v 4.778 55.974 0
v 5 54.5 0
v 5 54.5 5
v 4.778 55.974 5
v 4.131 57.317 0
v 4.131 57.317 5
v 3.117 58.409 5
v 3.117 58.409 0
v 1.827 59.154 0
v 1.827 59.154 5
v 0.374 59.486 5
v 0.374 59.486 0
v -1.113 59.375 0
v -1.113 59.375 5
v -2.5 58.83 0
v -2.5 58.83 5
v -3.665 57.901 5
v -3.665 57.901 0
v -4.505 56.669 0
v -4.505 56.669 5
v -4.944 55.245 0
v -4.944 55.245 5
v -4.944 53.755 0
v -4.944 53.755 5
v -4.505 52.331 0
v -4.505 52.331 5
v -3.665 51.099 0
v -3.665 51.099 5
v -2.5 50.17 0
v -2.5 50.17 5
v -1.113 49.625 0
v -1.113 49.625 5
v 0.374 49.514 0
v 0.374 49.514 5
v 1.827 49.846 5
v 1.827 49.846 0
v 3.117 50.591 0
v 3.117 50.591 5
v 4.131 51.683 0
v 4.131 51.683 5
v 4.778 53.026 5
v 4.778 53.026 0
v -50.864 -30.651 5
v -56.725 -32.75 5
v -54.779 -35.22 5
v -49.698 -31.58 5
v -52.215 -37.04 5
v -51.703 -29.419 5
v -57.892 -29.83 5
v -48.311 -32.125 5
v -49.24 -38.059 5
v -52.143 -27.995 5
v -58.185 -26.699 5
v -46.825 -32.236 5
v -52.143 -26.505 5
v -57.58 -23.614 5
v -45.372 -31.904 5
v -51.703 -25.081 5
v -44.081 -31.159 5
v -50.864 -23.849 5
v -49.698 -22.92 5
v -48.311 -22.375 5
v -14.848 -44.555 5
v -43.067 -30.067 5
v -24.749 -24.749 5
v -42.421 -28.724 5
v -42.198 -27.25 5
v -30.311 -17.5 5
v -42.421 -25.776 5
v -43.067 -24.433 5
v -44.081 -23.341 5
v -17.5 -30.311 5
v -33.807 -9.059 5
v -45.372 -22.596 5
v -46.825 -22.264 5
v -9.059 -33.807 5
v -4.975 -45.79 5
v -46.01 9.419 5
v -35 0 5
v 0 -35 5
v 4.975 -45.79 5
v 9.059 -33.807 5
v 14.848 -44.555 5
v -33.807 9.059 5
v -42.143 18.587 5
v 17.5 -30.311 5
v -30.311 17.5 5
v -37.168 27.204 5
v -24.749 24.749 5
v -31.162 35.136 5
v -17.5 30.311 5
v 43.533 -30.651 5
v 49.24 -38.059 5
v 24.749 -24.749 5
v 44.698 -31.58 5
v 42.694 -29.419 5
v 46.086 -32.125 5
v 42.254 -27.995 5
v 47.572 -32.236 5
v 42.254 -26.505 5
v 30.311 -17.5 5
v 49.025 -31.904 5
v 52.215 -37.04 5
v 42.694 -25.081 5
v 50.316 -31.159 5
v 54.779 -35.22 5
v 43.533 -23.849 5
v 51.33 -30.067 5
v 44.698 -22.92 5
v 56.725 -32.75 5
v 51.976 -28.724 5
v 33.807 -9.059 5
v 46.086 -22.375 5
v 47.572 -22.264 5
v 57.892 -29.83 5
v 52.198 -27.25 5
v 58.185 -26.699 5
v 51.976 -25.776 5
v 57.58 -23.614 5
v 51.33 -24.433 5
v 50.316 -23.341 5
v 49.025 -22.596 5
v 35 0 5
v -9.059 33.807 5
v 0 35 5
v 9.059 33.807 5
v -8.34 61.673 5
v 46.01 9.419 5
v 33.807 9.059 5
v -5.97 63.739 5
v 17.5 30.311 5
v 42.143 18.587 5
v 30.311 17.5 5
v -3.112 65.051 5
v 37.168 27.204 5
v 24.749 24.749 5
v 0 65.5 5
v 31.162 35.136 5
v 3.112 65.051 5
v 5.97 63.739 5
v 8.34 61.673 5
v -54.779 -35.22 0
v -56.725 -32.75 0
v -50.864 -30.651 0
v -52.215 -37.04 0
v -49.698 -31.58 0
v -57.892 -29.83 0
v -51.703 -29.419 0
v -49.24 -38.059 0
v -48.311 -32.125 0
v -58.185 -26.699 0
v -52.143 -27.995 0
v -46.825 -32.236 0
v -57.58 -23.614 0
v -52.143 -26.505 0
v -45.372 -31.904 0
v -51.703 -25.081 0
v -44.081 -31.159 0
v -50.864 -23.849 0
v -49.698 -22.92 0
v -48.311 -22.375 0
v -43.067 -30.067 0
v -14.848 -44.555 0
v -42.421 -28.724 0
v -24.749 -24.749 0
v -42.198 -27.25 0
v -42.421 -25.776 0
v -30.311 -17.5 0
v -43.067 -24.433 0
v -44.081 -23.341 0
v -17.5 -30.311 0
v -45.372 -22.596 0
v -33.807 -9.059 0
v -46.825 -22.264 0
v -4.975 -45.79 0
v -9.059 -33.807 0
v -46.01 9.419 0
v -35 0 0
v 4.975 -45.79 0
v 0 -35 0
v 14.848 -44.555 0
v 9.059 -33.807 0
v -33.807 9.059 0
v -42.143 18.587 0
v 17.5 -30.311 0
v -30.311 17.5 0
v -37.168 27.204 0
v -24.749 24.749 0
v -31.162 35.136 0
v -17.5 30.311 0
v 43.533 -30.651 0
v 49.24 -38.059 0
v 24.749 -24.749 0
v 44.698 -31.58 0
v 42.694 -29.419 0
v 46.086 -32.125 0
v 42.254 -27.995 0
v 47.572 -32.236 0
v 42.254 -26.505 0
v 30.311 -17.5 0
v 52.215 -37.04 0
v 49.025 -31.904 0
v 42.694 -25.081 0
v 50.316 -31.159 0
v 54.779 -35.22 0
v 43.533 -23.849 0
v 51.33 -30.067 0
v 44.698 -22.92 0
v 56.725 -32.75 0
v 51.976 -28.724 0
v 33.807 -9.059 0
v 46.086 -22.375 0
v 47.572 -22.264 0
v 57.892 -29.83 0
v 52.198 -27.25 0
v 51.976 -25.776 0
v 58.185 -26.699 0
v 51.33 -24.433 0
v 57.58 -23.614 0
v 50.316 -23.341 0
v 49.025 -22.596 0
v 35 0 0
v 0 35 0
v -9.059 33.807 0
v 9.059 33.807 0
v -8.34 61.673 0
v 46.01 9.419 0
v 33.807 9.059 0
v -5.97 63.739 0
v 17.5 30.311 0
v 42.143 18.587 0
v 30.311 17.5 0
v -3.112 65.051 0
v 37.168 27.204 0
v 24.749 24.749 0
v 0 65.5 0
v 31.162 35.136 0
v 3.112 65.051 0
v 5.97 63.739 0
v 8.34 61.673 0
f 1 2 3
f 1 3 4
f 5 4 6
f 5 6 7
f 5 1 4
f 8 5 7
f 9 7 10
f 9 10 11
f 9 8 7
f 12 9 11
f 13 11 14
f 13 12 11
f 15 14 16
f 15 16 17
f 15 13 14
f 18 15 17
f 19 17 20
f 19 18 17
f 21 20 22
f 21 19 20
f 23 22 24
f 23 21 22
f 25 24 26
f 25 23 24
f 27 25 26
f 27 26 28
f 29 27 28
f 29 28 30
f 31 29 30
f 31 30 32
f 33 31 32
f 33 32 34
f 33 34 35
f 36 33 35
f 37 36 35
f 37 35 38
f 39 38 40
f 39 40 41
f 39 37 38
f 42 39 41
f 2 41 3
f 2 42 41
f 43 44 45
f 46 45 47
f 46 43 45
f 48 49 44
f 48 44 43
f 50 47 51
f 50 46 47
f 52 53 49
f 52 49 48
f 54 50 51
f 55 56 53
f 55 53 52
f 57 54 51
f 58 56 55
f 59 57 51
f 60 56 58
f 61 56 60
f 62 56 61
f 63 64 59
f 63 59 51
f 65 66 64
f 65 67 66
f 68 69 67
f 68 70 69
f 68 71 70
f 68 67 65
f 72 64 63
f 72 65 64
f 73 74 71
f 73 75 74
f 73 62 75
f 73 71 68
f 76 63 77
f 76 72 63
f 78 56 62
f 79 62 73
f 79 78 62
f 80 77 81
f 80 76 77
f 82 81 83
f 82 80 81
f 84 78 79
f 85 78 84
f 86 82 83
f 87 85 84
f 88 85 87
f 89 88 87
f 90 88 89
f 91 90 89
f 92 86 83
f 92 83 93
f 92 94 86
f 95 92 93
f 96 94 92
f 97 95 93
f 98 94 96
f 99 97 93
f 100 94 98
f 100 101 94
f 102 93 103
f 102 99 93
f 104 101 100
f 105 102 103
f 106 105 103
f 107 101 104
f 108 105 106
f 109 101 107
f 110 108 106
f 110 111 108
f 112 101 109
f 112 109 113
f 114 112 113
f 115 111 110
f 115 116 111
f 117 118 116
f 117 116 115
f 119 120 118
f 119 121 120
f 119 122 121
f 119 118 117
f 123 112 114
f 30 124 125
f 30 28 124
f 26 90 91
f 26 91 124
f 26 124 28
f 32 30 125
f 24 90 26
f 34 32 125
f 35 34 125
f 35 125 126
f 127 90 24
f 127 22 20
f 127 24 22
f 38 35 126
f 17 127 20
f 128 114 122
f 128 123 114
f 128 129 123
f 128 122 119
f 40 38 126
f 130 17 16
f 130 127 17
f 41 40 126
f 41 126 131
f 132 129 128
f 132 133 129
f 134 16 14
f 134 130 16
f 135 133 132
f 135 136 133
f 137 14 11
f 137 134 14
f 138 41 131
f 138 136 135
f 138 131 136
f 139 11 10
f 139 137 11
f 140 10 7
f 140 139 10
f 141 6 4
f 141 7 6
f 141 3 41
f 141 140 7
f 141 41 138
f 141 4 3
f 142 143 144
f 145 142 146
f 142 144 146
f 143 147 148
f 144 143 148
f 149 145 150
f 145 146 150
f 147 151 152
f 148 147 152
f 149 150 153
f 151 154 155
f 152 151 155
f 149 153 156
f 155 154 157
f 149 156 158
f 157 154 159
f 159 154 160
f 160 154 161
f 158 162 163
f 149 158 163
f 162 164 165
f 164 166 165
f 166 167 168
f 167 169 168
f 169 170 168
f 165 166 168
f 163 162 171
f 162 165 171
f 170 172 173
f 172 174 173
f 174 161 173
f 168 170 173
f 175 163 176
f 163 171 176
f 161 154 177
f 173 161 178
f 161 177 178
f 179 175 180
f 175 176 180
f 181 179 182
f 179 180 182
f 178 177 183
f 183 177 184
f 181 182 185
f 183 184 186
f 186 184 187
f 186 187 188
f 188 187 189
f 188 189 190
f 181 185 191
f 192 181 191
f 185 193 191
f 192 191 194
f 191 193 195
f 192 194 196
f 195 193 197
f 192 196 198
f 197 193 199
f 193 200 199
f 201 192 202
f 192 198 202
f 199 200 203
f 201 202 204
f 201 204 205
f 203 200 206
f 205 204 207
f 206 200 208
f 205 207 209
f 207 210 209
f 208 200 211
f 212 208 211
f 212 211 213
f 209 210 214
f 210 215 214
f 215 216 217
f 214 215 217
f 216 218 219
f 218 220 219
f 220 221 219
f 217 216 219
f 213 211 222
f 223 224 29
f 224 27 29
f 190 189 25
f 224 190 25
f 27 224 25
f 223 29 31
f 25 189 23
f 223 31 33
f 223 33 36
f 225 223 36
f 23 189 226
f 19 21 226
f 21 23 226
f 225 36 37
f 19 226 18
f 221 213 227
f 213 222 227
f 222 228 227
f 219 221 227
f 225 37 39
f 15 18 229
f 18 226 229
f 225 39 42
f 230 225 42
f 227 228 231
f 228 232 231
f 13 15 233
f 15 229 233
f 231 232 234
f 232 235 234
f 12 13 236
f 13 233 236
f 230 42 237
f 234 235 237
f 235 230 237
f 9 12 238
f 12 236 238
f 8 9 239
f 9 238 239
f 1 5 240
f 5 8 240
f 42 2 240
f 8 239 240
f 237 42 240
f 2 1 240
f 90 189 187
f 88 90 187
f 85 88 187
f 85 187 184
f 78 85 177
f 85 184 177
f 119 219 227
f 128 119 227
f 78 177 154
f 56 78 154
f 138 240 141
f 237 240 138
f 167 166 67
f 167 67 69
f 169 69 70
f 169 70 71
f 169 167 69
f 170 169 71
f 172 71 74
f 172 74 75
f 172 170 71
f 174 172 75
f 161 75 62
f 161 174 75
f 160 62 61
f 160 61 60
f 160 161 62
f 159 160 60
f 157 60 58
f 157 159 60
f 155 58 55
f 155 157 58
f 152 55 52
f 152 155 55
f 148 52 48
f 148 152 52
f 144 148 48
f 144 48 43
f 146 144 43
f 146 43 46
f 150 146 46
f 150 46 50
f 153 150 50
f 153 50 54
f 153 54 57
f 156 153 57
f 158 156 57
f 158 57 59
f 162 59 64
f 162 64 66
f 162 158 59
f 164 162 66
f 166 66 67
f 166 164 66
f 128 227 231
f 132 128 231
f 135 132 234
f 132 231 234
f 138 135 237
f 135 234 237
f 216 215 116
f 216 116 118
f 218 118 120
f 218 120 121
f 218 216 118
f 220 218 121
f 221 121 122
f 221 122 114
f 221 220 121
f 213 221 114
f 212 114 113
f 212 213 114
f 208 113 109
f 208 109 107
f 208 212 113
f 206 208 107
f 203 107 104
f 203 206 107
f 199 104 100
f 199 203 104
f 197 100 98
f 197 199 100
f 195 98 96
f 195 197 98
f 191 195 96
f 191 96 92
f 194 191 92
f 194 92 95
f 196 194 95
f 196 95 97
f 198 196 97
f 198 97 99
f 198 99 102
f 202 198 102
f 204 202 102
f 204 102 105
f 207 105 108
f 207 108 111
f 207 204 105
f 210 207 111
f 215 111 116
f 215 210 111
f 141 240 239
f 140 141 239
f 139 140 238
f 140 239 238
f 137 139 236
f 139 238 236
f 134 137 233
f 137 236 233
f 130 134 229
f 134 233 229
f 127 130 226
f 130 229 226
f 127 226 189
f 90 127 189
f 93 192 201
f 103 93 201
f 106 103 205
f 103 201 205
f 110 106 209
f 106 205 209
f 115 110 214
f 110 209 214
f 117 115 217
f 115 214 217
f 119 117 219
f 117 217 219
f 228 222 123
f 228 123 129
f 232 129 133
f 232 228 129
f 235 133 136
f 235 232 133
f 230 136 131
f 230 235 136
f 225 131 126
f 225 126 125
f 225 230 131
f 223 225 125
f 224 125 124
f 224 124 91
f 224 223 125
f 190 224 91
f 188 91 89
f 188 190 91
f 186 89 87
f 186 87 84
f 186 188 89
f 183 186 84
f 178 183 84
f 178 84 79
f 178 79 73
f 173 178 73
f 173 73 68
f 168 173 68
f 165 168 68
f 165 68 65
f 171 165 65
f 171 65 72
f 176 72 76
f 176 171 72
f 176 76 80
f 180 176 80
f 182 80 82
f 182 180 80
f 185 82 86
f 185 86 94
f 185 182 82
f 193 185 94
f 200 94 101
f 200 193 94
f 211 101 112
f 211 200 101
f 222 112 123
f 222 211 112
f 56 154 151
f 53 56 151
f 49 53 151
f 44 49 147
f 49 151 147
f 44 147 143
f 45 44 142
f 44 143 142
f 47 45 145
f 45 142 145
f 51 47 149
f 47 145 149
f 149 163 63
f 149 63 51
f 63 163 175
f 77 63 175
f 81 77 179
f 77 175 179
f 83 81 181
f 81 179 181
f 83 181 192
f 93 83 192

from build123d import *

# Parameters (mm, degrees)
SKETCH_R   = 35
SKETCH_R_2 = 5
PAD_DEPTH  = 5


with BuildPart() as part:
    # Sketch → Pad (new body)
    with BuildSketch(Plane.XY):
        with BuildLine():
            ThreePointArc((8.339953, 61.67253), (0, 65.5), (-8.339953, 61.67253))
            Line((-8.339953, 61.67253), (-31.16164, 35.136317))
            ThreePointArc((-31.16164, 35.136317), (-39.78947, 22.972461), (-46.009763, 9.418613))
            Line((-46.009763, 9.418613), (-57.579954, -23.613654))
            ThreePointArc((-57.579954, -23.613654), (-56.724664, -32.75), (-49.240001, -38.058876))
            Line((-14.848123, -44.55493), (-49.240001, -38.058876))
            ThreePointArc((-14.848123, -44.55493), (0, -45.944923), (14.848123, -44.55493))
            Line((14.848123, -44.55493), (49.240001, -38.058876))
            ThreePointArc((49.240001, -38.058876), (56.724664, -32.75), (57.579954, -23.613654))
            Line((57.579954, -23.613654), (46.009763, 9.418613))
            ThreePointArc((46.009763, 9.418613), (39.78947, 22.972461), (31.16164, 35.136317))
            Line((8.339953, 61.67253), (31.16164, 35.136317))
        make_face()
        Circle(SKETCH_R, mode=Mode.SUBTRACT)
        with Locations((-47.198385, -27.25)):
            Circle(SKETCH_R_2, mode=Mode.SUBTRACT)
        with Locations((47.198385, -27.25)):
            Circle(SKETCH_R_2, mode=Mode.SUBTRACT)
        with Locations((0, 54.5)):
            Circle(SKETCH_R_2, mode=Mode.SUBTRACT)
    extrude(amount=PAD_DEPTH)


solid = part.part
